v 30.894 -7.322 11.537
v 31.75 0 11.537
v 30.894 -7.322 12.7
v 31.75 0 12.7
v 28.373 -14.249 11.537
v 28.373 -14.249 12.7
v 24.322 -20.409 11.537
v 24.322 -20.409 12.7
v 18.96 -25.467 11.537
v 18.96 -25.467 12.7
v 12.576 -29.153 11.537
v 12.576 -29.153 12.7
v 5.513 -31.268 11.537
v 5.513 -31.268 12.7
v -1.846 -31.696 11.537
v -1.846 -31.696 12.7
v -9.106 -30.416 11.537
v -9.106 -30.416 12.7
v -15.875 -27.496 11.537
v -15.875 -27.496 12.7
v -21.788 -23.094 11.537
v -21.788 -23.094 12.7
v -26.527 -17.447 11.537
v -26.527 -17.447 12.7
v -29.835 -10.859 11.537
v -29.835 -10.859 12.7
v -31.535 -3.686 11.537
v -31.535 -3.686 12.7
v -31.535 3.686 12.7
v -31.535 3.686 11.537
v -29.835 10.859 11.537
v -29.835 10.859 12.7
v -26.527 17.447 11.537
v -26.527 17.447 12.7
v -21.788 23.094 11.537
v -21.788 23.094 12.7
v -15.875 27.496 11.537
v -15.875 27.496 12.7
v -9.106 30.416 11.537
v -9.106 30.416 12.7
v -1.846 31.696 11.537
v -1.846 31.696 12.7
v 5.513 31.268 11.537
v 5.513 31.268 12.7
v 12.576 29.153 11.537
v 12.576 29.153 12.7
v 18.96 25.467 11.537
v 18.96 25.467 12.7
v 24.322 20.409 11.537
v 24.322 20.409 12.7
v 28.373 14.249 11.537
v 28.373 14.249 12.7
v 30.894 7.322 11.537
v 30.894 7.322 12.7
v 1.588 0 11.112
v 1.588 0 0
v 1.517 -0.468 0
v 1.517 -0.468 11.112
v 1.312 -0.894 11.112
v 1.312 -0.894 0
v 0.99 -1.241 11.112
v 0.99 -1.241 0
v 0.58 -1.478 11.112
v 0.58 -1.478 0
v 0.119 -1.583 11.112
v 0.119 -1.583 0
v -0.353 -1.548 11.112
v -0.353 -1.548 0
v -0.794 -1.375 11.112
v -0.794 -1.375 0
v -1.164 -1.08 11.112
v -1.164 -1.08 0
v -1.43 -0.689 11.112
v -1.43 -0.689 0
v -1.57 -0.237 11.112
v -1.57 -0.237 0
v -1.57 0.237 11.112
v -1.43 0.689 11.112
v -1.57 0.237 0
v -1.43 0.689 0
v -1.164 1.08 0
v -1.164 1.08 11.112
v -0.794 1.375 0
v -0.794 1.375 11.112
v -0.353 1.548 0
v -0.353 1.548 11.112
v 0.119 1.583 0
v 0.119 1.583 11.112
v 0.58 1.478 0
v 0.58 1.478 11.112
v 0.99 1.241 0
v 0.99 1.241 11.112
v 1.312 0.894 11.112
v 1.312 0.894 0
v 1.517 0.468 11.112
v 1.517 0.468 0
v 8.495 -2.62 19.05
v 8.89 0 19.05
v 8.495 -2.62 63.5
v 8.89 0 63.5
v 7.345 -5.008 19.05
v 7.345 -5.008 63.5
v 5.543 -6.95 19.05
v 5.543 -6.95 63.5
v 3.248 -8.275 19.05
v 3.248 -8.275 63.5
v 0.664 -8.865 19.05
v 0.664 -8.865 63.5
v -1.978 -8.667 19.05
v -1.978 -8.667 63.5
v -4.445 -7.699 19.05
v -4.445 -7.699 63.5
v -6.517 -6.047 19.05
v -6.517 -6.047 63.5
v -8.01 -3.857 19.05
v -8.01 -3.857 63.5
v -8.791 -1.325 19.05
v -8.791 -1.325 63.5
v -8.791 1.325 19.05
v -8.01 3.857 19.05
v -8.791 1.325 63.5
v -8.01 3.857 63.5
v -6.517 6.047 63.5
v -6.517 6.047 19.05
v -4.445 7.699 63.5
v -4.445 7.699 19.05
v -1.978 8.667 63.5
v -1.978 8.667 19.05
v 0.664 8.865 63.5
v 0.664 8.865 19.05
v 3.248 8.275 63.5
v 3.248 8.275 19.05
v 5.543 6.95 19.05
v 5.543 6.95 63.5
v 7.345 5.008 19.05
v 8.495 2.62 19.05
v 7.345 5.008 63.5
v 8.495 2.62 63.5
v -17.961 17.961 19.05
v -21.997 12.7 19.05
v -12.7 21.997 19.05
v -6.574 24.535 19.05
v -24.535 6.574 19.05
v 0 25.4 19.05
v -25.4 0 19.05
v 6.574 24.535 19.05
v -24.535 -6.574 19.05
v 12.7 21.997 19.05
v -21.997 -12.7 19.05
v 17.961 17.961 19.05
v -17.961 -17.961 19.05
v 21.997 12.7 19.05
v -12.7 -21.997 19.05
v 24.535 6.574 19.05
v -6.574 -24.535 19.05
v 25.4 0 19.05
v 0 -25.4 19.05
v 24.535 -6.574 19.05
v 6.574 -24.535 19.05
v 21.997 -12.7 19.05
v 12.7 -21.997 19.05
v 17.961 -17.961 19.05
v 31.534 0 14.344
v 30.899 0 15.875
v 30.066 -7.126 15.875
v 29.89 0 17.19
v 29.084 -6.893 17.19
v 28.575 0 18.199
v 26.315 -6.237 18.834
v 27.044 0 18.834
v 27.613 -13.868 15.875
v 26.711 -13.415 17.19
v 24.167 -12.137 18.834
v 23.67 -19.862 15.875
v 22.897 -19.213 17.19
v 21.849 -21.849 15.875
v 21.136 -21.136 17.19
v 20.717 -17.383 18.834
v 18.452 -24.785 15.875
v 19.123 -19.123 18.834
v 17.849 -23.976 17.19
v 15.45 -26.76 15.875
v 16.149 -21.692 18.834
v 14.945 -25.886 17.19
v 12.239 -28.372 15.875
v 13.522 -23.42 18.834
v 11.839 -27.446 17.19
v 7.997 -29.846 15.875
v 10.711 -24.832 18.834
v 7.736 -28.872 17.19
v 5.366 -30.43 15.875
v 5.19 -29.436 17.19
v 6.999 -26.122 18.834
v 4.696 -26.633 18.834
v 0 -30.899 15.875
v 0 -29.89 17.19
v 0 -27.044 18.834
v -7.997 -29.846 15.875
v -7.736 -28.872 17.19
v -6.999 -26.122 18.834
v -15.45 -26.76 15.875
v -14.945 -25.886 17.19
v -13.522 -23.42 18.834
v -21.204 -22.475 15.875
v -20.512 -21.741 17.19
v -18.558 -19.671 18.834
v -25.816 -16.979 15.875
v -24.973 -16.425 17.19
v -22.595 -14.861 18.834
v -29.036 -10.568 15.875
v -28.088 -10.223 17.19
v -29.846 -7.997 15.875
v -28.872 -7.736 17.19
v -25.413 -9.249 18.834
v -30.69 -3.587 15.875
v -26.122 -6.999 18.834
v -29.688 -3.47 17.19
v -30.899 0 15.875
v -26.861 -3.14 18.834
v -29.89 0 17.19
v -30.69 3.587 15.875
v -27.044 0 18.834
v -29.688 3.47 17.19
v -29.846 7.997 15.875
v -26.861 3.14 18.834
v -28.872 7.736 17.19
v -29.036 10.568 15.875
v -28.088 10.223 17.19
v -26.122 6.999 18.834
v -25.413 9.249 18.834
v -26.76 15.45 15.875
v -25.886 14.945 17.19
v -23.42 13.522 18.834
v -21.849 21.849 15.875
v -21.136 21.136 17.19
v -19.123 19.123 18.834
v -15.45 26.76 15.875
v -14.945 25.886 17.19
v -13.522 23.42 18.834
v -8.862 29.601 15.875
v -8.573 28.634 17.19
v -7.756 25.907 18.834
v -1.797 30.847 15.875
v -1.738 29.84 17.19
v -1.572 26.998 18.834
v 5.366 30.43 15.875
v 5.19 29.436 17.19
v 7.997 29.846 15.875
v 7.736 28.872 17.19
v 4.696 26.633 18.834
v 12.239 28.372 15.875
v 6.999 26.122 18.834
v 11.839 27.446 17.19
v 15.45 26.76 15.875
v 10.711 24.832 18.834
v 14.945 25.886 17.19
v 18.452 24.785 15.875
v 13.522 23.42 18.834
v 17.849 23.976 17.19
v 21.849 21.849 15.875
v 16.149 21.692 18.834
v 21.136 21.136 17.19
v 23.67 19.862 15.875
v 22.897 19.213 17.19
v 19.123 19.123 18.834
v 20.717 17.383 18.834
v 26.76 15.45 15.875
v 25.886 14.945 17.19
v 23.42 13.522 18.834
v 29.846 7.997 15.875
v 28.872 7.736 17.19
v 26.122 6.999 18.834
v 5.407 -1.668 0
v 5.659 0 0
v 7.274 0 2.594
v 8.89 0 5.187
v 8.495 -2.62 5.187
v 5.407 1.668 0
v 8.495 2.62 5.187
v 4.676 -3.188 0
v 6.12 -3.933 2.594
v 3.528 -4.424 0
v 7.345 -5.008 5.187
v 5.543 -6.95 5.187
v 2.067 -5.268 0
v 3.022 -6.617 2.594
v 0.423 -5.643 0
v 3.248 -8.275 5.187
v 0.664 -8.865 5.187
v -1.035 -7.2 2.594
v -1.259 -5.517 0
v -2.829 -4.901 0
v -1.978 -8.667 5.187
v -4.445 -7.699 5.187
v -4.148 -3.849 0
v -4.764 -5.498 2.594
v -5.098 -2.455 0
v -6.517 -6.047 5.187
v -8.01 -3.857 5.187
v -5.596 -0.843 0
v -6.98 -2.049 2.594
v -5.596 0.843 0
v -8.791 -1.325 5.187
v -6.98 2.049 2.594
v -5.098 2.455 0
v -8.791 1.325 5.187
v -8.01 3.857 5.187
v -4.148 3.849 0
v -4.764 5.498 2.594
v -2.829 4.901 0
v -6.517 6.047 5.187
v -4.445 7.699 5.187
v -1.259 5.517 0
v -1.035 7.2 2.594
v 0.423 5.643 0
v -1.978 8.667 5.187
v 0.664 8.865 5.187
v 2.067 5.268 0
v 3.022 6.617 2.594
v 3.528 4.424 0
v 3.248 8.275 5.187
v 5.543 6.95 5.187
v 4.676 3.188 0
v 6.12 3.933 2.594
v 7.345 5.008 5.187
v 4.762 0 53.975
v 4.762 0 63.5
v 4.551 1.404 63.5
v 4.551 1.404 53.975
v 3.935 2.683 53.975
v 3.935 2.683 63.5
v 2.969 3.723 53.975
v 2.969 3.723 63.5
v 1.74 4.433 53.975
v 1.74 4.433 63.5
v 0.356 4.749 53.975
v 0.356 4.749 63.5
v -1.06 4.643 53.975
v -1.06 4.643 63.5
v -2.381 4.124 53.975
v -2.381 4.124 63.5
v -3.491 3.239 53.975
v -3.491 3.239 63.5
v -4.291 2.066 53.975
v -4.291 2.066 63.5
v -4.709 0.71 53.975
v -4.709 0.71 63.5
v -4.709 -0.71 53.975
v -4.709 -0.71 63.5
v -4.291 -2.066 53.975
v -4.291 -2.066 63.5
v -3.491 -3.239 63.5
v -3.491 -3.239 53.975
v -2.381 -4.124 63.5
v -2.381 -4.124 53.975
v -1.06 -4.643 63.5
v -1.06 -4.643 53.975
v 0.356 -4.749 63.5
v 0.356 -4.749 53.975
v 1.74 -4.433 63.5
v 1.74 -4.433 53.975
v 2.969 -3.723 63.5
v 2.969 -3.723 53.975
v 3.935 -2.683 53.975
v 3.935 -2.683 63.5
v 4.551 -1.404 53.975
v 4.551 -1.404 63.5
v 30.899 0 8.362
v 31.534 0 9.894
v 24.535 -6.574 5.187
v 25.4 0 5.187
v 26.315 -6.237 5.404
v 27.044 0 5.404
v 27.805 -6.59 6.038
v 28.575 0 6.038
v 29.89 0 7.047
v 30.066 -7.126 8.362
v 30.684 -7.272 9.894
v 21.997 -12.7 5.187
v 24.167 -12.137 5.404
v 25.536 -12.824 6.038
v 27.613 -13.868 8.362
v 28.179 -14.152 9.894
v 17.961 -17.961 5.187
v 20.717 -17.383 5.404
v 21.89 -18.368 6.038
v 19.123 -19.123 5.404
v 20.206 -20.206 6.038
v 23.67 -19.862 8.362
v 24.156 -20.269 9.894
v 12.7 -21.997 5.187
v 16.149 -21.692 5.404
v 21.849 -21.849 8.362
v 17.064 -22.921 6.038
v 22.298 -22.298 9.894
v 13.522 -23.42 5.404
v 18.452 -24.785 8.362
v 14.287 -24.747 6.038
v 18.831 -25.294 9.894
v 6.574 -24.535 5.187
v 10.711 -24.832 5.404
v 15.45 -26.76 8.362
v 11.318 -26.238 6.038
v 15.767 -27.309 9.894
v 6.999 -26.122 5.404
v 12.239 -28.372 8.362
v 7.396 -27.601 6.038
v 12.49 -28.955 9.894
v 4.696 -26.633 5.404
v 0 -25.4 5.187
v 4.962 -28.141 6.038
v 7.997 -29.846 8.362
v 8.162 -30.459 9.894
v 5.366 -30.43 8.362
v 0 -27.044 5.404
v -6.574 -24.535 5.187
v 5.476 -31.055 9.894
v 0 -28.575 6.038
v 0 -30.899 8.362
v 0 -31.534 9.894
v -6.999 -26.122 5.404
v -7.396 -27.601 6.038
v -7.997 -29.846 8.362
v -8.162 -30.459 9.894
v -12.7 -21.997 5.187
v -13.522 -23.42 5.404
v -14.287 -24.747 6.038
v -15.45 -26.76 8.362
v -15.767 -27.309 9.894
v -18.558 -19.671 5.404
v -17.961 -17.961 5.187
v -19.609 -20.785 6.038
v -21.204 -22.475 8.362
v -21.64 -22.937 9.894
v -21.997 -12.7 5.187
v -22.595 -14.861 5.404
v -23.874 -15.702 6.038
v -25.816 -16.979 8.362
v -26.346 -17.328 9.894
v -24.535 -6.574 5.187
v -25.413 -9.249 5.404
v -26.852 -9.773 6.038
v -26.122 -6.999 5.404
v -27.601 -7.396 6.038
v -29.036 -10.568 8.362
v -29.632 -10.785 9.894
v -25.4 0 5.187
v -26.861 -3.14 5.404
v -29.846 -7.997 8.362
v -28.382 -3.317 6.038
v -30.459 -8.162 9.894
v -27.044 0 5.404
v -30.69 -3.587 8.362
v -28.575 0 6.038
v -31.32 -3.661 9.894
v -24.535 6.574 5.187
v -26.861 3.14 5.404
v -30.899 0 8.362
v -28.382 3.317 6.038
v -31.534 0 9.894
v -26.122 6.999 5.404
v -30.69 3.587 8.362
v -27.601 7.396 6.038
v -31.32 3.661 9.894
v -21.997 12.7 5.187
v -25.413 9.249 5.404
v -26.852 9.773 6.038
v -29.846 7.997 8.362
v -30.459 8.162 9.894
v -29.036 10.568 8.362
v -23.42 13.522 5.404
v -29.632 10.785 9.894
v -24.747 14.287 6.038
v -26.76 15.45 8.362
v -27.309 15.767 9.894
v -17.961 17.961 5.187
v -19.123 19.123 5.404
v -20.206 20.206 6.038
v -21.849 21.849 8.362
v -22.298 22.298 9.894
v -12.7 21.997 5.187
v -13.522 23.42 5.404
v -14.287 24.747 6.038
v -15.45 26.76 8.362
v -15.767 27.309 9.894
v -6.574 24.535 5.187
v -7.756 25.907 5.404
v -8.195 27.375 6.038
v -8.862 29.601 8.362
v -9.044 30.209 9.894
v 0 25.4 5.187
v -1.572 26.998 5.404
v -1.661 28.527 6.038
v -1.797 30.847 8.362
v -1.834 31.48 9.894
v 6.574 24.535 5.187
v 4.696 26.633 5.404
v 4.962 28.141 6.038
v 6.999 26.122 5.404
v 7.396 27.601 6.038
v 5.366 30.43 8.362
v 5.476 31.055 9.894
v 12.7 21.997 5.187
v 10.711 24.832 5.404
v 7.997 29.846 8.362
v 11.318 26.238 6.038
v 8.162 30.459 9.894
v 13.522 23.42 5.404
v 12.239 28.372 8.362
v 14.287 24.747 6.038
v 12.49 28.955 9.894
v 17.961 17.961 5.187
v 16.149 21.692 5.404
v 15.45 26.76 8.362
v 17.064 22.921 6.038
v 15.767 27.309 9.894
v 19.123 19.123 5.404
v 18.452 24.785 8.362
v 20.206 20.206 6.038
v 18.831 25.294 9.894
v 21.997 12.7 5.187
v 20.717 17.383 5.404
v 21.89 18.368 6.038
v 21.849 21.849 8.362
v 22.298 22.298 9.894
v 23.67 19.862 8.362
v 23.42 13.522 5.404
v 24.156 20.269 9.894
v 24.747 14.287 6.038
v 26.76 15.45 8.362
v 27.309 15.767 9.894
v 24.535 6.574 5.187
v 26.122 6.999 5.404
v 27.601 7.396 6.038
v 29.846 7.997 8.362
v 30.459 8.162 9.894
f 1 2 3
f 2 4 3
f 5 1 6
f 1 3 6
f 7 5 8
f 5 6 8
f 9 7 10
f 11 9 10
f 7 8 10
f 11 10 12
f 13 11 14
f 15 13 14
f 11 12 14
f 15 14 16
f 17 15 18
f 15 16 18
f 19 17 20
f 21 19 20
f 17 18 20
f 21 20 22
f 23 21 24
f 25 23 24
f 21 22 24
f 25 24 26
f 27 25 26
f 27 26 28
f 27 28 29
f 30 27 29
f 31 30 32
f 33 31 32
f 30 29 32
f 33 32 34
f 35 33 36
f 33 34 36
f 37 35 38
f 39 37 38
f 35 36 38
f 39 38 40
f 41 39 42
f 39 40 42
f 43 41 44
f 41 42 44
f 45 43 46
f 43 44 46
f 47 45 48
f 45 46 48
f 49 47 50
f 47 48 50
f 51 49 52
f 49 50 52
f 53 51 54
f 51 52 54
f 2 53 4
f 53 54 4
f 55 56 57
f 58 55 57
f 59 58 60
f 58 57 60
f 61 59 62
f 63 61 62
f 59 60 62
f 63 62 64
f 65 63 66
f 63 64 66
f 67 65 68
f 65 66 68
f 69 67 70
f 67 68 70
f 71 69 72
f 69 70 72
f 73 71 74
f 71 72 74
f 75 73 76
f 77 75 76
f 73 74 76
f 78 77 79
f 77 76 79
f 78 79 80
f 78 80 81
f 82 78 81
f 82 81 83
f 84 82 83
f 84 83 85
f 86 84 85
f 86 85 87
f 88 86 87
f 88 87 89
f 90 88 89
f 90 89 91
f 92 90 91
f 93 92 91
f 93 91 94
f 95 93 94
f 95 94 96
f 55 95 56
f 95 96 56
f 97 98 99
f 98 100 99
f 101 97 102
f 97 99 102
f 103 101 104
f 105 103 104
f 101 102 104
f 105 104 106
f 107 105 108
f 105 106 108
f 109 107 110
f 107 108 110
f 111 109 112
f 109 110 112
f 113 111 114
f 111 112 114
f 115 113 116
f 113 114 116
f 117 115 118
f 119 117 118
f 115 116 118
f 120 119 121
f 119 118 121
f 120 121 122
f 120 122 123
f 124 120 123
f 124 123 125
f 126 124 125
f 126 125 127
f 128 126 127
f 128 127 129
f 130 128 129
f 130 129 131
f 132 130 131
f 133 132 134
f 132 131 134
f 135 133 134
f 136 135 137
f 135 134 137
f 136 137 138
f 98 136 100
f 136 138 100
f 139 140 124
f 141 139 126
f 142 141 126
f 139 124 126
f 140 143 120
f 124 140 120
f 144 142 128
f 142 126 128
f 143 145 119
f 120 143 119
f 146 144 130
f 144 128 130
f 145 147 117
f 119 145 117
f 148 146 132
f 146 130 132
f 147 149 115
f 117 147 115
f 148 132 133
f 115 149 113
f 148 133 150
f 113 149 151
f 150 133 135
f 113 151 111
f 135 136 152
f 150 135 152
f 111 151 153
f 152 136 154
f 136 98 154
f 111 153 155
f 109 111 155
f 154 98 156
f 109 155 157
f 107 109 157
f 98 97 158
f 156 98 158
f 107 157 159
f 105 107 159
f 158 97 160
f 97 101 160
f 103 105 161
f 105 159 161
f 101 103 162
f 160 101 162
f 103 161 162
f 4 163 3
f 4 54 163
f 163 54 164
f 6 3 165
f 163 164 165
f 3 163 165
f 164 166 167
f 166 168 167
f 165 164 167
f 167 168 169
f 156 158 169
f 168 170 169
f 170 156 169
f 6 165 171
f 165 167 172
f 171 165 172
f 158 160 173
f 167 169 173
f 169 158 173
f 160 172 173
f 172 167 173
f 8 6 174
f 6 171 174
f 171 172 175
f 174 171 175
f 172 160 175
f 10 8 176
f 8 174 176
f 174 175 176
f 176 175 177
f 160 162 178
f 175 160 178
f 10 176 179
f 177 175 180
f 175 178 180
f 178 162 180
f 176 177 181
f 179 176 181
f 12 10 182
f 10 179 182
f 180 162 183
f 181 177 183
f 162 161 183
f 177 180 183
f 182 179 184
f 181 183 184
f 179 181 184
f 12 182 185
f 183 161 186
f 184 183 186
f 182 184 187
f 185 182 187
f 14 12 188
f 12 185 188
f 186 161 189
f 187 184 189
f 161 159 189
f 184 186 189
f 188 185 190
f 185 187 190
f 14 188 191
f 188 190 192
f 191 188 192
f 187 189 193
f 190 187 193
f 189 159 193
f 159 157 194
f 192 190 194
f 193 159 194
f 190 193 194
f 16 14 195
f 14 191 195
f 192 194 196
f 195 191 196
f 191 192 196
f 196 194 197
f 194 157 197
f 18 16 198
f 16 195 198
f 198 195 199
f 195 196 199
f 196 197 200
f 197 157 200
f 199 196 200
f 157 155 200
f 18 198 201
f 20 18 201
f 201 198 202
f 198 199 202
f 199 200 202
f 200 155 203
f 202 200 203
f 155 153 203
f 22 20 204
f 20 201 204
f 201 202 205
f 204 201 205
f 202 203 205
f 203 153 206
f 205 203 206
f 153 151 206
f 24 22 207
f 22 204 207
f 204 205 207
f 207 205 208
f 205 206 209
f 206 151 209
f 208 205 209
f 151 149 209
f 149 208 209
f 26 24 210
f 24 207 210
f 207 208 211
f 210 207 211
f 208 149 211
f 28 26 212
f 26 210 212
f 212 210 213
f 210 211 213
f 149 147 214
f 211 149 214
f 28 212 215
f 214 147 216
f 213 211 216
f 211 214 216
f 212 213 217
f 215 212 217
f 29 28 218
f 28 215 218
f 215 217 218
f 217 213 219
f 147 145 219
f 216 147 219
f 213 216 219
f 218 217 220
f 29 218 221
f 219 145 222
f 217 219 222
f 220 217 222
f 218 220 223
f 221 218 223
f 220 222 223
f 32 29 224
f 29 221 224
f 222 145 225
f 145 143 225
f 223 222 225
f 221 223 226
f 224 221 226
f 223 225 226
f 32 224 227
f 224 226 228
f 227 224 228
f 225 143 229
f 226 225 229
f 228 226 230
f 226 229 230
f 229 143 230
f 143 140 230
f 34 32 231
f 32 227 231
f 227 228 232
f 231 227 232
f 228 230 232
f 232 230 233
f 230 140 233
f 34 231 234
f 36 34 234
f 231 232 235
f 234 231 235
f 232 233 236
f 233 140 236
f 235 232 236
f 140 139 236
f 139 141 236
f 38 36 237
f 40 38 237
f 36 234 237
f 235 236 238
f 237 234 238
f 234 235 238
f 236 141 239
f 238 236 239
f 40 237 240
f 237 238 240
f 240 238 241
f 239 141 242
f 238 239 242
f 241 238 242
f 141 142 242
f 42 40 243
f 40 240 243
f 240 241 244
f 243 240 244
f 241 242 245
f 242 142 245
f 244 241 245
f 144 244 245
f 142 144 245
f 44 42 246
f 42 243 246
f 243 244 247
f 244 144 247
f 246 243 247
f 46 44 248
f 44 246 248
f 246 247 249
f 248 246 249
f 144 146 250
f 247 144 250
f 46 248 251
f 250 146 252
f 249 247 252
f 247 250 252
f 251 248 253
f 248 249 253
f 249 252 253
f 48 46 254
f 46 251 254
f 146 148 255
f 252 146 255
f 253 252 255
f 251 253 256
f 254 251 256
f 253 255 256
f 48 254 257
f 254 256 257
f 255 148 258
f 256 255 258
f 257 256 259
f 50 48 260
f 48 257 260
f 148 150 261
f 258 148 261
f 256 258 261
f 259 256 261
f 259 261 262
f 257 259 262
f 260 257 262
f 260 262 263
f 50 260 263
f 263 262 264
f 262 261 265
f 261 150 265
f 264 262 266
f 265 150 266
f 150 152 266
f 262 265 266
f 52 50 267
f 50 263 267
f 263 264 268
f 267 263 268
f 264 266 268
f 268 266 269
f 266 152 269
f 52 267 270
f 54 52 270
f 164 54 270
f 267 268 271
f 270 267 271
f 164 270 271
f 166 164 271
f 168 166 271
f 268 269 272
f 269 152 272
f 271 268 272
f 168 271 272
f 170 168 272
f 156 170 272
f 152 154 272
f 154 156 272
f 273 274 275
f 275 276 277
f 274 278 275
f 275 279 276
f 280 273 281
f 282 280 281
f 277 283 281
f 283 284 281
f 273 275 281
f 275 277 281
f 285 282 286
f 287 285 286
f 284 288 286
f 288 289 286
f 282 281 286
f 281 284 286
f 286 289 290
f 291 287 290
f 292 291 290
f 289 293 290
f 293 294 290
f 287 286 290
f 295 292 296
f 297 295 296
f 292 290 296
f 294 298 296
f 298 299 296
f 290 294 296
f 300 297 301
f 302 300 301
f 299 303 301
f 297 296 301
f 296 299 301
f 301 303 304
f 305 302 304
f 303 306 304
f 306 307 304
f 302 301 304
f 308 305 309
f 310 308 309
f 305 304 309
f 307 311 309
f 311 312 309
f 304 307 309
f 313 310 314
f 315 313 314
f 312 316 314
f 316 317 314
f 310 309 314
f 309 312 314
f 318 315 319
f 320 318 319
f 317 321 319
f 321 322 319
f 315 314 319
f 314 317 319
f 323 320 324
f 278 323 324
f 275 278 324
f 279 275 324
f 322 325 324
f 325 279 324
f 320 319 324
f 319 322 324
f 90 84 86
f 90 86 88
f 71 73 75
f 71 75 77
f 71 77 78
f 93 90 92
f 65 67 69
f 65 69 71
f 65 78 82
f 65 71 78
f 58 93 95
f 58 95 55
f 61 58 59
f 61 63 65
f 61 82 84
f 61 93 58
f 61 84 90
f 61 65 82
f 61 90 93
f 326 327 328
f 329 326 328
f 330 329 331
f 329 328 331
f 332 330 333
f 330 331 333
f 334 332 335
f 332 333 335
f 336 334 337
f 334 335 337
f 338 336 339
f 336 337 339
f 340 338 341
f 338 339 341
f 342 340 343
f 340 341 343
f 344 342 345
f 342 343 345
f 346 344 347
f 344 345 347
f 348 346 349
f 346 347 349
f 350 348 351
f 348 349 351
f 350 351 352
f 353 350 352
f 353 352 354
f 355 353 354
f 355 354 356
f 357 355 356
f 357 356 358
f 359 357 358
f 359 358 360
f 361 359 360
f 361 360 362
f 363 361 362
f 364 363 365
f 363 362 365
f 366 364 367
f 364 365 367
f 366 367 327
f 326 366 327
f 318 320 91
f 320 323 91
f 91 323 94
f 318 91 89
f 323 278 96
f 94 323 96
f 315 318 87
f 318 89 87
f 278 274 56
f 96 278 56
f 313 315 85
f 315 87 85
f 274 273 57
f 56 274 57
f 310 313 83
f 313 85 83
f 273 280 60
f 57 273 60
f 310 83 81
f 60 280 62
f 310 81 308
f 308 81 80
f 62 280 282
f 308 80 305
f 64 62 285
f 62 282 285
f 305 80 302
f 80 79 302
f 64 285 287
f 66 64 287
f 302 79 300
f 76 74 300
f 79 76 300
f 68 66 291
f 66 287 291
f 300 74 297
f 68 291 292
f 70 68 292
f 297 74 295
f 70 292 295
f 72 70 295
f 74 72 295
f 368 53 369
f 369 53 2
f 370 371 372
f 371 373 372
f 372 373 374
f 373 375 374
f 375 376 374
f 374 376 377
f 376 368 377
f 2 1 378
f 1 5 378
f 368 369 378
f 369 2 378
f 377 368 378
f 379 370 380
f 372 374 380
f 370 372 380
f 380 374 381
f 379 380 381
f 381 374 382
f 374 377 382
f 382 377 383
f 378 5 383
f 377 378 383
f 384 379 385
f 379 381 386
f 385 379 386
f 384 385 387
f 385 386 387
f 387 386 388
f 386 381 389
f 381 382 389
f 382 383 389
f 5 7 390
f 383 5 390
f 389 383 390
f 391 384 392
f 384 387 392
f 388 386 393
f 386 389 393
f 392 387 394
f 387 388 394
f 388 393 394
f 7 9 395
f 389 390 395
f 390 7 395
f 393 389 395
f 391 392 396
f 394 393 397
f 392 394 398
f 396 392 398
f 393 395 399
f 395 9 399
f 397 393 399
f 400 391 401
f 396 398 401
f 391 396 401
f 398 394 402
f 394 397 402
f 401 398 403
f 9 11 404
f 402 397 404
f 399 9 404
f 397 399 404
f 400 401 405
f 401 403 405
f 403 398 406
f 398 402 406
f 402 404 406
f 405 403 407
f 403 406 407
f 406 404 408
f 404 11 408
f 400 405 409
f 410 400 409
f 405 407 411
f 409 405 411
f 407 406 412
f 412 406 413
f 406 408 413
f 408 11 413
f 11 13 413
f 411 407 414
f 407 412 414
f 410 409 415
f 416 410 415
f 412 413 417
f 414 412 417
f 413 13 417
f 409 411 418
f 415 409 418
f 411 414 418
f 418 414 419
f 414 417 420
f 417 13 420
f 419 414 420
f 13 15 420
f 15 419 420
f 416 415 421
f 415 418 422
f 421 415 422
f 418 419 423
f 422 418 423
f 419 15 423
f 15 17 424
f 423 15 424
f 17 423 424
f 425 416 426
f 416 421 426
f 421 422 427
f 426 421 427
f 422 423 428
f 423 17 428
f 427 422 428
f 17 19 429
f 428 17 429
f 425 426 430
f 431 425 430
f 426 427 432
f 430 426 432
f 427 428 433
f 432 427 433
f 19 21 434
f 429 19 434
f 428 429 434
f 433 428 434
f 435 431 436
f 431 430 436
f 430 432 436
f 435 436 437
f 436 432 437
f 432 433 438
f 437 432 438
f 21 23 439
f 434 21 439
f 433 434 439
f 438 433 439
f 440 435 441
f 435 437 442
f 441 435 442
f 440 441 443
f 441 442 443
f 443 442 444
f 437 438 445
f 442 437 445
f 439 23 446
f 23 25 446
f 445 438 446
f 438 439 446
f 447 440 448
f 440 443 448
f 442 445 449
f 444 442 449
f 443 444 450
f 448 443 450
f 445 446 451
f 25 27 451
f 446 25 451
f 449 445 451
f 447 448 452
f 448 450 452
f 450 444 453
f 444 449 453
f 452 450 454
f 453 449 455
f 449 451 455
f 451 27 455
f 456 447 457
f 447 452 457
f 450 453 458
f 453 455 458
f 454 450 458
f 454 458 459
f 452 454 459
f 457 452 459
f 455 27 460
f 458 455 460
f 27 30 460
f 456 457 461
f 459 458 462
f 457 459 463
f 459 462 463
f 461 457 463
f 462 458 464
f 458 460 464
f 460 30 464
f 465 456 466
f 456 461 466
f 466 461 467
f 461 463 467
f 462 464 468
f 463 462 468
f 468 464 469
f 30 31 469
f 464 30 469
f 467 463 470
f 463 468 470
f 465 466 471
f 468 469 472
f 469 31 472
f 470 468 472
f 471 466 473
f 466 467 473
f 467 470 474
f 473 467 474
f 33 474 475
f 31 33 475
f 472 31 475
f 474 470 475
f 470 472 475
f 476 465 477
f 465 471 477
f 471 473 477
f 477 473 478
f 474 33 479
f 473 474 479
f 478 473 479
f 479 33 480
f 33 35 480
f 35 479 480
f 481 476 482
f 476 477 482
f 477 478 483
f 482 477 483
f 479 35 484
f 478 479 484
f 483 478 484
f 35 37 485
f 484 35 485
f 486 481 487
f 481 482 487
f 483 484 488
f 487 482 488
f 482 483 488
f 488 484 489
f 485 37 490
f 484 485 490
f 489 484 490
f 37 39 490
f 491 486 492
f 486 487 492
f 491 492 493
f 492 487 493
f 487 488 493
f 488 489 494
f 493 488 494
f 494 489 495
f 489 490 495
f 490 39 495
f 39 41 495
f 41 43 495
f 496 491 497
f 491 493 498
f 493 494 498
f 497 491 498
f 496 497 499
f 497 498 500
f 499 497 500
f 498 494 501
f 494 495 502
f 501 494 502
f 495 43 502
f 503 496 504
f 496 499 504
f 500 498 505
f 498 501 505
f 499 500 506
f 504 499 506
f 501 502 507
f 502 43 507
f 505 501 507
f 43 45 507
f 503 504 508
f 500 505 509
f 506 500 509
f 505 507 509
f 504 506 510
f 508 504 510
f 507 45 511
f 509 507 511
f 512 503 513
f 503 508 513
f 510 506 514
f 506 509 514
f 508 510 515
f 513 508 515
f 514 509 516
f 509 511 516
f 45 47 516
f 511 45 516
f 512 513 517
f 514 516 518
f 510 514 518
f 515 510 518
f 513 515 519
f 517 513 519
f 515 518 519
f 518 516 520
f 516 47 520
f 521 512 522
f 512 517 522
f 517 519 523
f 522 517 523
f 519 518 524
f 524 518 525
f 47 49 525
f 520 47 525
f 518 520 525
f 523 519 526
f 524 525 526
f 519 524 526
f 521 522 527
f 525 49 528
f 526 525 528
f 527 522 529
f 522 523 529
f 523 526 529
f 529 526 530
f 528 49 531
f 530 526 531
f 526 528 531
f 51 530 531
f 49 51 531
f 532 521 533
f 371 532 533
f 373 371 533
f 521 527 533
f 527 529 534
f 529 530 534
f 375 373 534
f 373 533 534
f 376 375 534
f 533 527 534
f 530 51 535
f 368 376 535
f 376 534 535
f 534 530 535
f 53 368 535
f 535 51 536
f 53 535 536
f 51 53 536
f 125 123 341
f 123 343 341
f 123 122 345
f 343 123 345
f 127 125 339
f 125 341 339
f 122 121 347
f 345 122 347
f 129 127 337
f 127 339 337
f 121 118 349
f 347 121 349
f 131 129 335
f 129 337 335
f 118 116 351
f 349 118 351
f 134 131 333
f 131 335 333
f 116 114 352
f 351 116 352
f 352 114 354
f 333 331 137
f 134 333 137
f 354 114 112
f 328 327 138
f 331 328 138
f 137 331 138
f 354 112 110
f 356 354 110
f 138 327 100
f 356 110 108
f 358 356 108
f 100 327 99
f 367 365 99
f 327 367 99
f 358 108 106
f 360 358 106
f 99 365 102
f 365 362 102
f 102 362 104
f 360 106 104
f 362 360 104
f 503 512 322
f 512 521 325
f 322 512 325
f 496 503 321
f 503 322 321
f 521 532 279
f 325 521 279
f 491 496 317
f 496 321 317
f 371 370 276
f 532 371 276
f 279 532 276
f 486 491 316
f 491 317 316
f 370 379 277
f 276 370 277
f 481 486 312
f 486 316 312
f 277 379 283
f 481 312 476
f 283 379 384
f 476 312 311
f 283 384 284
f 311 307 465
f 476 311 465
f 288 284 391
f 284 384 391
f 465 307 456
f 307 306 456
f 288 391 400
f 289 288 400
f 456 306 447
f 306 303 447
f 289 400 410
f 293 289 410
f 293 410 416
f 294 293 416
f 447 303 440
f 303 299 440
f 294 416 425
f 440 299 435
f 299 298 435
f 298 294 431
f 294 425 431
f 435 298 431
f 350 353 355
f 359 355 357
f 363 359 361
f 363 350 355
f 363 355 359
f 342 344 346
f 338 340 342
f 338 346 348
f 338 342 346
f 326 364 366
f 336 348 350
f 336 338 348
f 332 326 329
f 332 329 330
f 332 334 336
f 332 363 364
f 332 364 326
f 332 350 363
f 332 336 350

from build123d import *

# Parameters (mm, degrees)
F2_R     = 1.5875
F3_DEPTH = 11.1125
F4_R     = 4.7625
F5_DEPTH = 9.525


with BuildPart() as f1:
    # F0 (on Front) → F1 (revolve)
    with BuildSketch(Plane.XZ):
        with BuildLine():
            Line((0, 63.5), (0, 0))
            Line((0, 0), (5.658861, 0))
            Line((5.658861, 0), (8.89, 5.187289))
            Line((8.89, 5.187289), (25.4, 5.187289))
            ThreePointArc((25.4, 5.187289), (29.890128, 7.047161), (31.75, 11.537289))
            Line((31.75, 11.537289), (31.75, 12.7))
            ThreePointArc((31.75, 12.7), (29.890128, 17.190128), (25.4, 19.05))
            Line((25.4, 19.05), (8.89, 19.05))
            Line((8.89, 19.05), (8.89, 63.5))
            Line((8.89, 63.5), (0, 63.5))
        make_face()
    revolve(axis=Axis((0, 0, 31.75), (0, 0, -1)))

    # F2 (on face) → F3 (cut)
    with BuildSketch(Plane(origin=(0, 0, 0), x_dir=(1, 0, 0), z_dir=(0, 0, -1))):
        Circle(F2_R)
    extrude(amount=-F3_DEPTH, mode=Mode.SUBTRACT)

    # F4 (on face) → F5 (cut)
    with BuildSketch(Plane.XY.offset(63.5)):
        Circle(F4_R)
    extrude(amount=-F5_DEPTH, mode=Mode.SUBTRACT)


solid = f1.part
